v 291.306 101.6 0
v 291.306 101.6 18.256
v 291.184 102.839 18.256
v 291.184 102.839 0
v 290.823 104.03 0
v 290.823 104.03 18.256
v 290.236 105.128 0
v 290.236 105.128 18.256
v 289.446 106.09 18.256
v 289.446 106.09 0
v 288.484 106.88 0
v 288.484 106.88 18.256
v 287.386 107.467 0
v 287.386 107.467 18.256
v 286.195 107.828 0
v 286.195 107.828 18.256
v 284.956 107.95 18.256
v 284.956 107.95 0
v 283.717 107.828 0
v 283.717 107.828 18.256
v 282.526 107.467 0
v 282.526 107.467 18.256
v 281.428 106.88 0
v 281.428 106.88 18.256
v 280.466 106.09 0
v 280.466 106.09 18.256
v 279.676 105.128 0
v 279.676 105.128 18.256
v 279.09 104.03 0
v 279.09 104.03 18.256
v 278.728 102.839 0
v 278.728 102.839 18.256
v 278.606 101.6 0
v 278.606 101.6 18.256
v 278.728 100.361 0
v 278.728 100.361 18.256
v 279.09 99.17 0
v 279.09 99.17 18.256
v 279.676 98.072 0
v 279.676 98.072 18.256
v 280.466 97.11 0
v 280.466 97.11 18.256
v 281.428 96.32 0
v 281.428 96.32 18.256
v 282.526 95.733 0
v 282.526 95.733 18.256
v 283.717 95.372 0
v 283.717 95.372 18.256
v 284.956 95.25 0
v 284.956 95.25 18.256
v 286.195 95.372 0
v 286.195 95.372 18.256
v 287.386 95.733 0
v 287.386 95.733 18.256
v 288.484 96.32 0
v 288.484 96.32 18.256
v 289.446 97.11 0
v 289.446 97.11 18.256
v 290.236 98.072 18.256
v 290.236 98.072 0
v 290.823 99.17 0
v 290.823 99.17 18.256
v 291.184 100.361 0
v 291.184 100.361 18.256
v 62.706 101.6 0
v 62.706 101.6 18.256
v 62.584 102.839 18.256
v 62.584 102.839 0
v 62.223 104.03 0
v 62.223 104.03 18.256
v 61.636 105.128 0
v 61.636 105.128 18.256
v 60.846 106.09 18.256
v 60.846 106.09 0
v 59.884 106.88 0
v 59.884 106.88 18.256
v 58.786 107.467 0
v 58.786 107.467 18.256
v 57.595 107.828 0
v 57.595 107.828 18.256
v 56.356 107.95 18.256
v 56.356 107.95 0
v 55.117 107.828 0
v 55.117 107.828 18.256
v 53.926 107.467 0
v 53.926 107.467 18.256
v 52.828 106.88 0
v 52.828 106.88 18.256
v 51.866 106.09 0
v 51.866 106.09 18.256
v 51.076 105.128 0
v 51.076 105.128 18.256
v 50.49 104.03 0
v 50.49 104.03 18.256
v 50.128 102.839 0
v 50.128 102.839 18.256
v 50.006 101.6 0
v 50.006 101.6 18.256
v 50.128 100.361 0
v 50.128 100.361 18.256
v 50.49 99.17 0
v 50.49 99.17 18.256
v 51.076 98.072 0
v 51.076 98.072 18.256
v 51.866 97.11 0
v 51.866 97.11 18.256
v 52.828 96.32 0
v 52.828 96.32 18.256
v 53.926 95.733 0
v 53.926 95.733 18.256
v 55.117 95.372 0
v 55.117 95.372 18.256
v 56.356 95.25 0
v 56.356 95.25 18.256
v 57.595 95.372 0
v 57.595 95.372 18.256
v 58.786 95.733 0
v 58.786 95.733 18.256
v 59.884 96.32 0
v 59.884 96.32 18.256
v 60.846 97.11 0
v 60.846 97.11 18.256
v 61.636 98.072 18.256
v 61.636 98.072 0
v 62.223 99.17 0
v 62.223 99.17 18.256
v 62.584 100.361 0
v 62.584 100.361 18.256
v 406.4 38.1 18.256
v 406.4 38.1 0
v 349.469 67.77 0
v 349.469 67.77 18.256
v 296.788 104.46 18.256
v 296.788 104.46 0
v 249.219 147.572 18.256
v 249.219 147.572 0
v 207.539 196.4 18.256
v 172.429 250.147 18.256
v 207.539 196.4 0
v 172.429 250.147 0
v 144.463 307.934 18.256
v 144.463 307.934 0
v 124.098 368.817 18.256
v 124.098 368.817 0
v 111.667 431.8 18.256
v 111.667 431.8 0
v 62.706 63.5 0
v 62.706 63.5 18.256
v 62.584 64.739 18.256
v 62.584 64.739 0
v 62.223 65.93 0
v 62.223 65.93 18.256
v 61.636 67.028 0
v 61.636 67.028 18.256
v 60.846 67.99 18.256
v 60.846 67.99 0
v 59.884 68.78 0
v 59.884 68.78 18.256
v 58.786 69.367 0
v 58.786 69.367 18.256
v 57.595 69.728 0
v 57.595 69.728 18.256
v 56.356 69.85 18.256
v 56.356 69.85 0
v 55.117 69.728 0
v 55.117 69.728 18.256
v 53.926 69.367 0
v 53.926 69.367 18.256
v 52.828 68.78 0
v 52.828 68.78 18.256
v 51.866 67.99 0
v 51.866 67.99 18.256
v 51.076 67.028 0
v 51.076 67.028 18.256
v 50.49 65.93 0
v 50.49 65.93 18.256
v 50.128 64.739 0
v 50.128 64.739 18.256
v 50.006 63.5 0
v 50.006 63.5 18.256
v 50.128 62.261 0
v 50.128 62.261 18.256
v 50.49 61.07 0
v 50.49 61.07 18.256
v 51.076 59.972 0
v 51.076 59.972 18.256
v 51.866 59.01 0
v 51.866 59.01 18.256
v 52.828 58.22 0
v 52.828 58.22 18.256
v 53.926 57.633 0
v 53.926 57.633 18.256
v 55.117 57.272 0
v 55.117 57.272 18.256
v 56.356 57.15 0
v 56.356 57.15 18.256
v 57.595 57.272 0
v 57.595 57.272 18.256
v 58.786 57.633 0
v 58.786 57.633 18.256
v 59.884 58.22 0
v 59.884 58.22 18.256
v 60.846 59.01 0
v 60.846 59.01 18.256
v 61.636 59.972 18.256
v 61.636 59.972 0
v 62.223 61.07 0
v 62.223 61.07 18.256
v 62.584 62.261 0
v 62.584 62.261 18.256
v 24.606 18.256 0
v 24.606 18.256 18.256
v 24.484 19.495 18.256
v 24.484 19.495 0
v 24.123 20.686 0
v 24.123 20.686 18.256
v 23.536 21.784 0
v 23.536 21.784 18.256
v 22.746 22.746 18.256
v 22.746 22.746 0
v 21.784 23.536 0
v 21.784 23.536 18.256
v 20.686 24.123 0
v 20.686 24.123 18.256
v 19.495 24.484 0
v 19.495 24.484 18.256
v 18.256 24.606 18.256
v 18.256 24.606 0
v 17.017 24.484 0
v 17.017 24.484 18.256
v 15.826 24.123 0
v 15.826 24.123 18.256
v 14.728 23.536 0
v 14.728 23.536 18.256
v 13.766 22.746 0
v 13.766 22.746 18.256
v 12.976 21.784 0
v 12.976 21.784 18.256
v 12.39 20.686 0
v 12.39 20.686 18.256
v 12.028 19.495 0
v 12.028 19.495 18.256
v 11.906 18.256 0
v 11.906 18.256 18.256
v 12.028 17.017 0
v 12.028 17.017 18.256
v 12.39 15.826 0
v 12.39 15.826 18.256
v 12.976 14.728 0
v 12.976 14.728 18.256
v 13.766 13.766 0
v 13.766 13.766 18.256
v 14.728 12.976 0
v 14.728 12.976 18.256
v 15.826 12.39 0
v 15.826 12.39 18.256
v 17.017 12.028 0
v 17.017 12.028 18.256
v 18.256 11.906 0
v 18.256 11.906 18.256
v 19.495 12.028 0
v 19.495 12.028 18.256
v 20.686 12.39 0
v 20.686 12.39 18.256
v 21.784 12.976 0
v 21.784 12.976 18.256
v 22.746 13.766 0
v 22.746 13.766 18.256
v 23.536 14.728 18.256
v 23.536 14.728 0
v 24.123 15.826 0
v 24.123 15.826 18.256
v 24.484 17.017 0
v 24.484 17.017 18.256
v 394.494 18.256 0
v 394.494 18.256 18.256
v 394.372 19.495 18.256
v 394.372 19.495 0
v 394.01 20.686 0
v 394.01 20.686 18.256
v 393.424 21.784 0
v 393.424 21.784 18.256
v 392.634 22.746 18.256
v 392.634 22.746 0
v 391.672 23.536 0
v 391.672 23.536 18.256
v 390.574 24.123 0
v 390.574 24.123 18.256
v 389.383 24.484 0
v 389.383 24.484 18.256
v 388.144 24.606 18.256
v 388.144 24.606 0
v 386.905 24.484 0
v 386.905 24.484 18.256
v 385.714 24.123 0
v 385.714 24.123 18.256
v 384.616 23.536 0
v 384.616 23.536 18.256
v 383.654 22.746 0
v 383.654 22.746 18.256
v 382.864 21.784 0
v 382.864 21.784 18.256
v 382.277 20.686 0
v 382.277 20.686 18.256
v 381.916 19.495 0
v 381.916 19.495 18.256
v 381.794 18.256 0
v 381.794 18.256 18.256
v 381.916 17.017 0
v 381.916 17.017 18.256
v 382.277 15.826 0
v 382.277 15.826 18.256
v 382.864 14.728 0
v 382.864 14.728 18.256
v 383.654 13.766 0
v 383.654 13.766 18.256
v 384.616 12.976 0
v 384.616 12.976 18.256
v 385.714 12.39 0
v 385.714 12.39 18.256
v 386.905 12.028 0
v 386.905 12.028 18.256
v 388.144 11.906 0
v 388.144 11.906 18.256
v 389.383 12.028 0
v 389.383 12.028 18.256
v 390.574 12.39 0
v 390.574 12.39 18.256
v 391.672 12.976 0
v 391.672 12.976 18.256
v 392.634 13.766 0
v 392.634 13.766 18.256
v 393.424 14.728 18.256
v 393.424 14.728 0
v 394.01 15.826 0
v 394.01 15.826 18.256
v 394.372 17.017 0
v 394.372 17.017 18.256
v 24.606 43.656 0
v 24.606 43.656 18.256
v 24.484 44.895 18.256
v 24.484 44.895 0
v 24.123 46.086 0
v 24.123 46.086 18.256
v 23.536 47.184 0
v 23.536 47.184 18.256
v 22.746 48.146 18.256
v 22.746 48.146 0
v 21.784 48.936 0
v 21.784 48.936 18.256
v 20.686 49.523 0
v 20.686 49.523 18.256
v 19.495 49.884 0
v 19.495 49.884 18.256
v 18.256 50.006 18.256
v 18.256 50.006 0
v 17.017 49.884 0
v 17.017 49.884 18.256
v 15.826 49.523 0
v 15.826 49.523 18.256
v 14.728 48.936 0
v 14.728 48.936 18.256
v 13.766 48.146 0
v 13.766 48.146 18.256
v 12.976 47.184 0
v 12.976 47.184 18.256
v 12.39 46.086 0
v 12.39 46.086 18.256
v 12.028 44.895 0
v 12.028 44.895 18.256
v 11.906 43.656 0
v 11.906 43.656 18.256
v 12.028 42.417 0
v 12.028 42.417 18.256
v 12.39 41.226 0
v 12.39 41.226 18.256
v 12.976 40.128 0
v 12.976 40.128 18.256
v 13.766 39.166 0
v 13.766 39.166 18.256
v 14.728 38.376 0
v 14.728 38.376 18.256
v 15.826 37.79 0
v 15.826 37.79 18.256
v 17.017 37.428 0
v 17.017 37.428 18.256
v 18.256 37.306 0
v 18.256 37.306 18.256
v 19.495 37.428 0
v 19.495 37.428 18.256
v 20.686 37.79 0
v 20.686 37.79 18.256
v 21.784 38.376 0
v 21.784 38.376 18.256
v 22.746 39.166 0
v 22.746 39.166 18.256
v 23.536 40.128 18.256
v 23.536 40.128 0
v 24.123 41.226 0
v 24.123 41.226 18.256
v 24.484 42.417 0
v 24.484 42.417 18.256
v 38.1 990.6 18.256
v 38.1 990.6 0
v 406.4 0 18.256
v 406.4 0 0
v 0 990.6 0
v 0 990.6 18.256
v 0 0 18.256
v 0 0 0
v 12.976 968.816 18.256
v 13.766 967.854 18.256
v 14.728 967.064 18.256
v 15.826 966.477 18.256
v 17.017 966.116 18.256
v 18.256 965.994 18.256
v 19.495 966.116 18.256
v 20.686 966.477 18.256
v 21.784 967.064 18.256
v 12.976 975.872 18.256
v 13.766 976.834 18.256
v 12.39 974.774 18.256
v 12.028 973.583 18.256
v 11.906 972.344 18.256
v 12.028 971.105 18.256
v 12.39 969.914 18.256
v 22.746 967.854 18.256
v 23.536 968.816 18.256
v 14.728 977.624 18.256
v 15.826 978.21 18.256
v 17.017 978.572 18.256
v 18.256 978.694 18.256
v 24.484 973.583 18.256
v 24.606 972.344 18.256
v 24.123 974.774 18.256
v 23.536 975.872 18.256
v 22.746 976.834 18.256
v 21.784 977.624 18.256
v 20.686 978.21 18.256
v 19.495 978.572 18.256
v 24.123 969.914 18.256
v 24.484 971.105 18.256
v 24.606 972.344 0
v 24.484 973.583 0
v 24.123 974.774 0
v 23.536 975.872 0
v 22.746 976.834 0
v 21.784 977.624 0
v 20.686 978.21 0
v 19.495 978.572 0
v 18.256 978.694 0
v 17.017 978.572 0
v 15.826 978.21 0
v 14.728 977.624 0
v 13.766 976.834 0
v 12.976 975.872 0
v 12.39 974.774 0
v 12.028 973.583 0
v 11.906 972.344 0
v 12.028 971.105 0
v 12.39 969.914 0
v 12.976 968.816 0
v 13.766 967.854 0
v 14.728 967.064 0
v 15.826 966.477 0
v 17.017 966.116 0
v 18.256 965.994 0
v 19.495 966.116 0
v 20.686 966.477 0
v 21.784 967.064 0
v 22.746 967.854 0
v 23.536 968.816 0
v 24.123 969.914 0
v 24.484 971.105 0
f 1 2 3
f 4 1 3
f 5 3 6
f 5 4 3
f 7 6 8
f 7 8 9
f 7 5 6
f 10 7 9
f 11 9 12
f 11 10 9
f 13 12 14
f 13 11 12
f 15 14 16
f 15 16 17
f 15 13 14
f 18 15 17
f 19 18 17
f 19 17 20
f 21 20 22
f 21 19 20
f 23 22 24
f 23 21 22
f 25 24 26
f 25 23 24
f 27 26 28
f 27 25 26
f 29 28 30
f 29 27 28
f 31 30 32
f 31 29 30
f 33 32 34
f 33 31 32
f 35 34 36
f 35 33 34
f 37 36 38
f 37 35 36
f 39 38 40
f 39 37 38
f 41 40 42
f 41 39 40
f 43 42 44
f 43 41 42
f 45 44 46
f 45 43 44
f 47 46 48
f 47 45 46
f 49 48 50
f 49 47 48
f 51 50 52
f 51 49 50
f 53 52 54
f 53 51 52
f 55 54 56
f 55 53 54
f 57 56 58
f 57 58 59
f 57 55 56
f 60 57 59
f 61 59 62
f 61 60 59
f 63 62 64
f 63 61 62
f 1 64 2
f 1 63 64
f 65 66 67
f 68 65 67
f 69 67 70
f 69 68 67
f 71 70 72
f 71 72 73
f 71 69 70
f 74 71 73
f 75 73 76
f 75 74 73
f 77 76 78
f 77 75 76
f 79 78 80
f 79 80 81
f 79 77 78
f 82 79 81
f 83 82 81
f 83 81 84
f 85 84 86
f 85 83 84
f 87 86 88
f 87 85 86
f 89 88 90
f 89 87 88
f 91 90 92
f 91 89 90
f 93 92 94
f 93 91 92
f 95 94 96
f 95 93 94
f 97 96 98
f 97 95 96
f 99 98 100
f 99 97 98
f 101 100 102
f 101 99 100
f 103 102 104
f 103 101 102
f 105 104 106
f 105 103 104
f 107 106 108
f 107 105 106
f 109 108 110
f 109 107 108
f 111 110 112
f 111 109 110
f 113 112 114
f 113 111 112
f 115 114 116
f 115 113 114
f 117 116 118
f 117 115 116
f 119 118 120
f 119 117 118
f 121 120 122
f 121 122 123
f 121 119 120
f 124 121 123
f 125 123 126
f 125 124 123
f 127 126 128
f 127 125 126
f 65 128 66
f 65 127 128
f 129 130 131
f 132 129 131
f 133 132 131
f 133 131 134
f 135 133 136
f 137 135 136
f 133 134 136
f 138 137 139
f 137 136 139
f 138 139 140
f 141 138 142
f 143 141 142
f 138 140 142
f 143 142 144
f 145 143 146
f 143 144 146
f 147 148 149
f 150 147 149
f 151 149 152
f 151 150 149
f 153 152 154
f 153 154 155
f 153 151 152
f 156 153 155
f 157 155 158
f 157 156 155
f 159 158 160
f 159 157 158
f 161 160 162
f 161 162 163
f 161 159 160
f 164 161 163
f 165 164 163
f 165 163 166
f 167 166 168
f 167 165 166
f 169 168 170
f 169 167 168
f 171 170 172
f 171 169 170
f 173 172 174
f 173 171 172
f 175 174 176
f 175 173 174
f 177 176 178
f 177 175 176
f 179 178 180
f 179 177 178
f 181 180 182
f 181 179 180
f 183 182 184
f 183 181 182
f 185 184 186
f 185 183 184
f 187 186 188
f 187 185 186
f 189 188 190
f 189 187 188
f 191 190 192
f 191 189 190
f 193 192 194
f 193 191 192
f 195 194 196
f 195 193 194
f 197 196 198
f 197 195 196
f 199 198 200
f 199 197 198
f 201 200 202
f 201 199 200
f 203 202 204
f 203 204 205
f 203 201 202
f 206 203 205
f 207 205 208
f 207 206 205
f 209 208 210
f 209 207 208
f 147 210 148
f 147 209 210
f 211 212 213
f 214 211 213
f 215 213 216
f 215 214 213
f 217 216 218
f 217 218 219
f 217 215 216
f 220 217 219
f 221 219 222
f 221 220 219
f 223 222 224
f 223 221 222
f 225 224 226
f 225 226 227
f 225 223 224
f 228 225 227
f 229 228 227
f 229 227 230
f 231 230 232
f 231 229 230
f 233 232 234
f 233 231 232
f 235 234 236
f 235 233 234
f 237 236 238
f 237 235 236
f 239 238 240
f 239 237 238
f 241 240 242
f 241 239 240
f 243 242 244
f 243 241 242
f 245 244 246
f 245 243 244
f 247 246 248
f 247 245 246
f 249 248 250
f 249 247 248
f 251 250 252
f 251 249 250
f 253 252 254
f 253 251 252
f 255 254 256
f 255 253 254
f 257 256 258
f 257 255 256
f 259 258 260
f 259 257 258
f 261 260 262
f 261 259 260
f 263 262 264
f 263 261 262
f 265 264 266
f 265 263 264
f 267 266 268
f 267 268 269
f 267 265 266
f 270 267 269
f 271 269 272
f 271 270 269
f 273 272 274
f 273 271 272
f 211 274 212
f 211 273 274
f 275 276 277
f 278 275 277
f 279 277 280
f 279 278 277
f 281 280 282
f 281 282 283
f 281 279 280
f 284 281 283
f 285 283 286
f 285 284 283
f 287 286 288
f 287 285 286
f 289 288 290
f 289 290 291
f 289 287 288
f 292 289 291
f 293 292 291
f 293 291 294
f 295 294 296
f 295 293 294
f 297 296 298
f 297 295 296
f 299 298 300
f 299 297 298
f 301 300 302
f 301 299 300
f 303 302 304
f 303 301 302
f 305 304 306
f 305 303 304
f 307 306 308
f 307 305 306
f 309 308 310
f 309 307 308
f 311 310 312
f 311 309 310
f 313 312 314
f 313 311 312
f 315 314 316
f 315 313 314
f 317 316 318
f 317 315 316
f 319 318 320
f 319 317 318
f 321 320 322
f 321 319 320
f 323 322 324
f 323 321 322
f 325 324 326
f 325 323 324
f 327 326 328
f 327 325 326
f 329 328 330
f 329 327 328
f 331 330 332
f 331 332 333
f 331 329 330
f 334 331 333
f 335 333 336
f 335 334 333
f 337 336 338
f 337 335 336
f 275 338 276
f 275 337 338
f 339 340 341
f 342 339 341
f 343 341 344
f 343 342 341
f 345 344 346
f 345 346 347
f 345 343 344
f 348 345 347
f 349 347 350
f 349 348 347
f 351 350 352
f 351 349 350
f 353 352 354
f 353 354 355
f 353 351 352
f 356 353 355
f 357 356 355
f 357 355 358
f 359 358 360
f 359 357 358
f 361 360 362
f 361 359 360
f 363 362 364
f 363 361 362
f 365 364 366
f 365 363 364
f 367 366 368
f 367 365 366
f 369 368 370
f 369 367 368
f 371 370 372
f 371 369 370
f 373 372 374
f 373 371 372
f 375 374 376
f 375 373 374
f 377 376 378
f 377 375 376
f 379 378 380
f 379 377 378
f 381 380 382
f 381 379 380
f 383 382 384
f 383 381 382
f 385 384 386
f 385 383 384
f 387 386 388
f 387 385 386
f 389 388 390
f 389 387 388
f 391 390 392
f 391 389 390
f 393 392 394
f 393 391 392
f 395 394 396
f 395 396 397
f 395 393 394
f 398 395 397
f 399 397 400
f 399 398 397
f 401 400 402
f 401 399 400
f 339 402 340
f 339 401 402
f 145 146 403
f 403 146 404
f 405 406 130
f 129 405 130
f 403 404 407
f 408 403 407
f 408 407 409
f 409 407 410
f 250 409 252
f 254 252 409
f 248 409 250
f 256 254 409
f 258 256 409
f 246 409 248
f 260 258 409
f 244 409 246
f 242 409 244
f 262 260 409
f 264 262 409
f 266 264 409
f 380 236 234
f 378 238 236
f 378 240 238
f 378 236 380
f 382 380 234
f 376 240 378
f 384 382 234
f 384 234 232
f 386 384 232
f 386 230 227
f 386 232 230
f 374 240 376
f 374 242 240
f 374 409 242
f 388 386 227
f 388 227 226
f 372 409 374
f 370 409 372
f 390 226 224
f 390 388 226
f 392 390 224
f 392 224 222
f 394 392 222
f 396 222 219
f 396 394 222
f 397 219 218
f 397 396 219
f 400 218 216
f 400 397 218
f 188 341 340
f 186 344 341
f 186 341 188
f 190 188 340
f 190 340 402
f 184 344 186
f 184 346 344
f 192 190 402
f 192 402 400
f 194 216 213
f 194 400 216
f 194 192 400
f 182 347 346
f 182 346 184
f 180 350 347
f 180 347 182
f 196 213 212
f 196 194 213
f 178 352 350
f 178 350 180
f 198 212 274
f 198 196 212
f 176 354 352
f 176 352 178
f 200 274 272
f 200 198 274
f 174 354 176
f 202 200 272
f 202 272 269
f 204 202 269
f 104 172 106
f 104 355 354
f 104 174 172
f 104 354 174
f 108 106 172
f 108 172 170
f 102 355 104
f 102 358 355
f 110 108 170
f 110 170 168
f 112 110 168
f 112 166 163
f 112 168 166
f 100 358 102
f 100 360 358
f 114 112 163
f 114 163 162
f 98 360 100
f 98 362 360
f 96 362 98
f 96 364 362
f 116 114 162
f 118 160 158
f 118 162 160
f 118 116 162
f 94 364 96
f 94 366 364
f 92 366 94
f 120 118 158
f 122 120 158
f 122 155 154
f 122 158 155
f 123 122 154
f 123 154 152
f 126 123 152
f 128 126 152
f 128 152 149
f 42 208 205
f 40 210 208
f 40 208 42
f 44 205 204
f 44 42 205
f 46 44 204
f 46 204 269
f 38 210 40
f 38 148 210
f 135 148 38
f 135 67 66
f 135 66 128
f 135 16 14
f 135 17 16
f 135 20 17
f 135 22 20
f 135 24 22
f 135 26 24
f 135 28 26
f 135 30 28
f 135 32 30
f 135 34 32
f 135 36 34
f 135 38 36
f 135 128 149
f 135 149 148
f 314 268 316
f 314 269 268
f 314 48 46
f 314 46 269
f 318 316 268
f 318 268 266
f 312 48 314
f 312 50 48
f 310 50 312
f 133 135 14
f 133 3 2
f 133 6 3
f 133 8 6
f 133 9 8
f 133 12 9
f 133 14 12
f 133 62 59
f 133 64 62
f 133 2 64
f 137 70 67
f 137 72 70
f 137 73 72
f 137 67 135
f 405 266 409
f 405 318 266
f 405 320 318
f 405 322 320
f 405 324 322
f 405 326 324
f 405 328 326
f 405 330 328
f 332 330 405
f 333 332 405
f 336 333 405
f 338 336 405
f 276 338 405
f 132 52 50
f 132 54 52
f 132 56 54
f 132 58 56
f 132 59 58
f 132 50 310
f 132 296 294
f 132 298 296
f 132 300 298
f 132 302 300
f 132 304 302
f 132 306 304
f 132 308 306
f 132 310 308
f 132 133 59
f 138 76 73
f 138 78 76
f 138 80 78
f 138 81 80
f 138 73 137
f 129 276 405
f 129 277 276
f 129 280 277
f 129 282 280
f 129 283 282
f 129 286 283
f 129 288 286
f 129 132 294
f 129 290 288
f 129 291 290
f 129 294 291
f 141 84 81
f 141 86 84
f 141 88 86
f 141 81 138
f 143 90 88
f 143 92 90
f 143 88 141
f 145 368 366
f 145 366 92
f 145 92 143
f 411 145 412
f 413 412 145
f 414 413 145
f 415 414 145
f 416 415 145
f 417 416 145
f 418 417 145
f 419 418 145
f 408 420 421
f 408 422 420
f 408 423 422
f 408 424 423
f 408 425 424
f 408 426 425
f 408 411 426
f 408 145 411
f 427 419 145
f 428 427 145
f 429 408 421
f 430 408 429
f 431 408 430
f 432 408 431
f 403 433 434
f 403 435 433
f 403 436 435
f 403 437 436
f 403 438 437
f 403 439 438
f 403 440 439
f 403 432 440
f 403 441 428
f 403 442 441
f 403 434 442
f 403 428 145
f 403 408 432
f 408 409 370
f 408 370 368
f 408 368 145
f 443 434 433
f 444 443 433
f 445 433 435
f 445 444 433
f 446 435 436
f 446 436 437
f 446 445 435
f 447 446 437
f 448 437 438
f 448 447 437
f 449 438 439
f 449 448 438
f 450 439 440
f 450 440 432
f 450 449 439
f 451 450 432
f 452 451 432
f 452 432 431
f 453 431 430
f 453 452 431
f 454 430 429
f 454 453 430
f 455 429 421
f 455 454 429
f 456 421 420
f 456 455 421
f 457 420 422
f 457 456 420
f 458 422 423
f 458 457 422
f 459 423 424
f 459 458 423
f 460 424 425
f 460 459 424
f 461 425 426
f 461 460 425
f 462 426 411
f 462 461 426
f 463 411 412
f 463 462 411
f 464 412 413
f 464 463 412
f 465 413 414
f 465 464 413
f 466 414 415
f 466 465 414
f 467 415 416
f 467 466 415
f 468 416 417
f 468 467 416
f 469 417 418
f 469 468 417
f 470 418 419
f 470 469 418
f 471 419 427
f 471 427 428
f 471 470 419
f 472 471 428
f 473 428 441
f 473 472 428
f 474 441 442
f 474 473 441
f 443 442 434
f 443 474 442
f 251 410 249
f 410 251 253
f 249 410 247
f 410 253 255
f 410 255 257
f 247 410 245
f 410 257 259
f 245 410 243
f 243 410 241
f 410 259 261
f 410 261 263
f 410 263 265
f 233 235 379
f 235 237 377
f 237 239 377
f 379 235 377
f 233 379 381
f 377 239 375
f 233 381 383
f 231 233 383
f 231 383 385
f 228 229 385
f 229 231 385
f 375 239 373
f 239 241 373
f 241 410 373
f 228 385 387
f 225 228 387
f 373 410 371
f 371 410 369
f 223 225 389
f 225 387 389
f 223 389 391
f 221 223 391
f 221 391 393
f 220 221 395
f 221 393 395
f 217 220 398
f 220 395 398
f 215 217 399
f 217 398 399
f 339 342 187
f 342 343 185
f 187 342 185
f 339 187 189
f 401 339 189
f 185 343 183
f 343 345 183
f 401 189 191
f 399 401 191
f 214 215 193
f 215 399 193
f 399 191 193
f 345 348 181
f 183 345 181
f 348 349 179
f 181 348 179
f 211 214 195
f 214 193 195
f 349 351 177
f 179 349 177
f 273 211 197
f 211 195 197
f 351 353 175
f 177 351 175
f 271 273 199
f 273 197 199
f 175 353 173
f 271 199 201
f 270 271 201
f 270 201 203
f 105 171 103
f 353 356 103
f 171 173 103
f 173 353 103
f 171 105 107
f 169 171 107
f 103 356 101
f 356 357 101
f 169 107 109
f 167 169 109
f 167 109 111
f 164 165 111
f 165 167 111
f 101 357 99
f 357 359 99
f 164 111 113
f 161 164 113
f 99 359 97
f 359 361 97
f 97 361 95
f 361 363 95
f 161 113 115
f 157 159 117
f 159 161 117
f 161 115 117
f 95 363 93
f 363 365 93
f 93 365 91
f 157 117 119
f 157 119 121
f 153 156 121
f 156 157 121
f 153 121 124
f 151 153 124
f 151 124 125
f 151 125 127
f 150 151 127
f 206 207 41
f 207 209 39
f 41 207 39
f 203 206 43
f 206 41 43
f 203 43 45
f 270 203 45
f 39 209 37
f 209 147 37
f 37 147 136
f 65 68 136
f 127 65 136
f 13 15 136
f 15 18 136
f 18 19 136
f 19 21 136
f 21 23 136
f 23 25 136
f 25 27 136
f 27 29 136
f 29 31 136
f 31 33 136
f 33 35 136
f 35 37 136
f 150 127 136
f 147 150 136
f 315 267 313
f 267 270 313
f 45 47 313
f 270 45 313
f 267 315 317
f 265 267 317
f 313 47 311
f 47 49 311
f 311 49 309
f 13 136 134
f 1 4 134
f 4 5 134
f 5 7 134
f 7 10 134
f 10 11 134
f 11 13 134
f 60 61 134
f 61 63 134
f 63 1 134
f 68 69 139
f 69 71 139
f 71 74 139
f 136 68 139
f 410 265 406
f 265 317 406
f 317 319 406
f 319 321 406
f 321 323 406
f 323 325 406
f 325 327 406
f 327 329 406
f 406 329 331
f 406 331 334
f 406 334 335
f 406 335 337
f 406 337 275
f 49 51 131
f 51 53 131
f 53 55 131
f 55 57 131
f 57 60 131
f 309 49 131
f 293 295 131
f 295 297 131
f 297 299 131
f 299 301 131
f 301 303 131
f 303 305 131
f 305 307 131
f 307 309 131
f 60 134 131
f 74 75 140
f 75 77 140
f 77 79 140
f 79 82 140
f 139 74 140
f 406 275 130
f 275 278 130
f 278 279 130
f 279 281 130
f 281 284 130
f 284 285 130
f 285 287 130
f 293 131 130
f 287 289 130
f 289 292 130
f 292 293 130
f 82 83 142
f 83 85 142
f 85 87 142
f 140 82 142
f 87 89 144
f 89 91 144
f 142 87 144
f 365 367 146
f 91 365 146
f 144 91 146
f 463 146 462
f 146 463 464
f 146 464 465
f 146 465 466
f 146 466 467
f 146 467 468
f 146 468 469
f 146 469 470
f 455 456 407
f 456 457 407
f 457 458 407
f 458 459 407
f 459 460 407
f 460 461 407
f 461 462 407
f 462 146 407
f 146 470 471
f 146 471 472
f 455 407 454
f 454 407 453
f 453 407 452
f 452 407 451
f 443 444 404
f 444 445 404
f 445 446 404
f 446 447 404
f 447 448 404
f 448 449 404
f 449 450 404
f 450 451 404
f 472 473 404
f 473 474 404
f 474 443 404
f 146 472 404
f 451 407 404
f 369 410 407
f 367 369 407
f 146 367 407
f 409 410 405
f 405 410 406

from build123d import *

# Parameters (mm, degrees)
SKETCH1_R           = 6.35
BOSS_EXTRUDE1_DEPTH = 18.25625


with BuildPart() as part:
    # Sketch1 → Boss-Extrude1 (new body)
    with BuildSketch(Plane.XY):
        with BuildLine():
            Line((0, 0), (406.4, 0))
            Line((406.4, 0), (406.4, 38.1))
            ThreePointArc((406.4, 38.1), (207.539140749, 196.40002074), (111.667415652, 431.8))
            Line((111.667415652, 431.8), (38.1, 990.6))
            Line((38.1, 990.6), (0, 990.6))
            Line((0, 990.6), (0, 0))
        make_face()
        with Locations((18.25625, 18.25625)):
            Circle(SKETCH1_R, mode=Mode.SUBTRACT)
        with Locations((388.14375, 18.25625)):
            Circle(SKETCH1_R, mode=Mode.SUBTRACT)
        with Locations((18.25625, 972.34375)):
            Circle(SKETCH1_R, mode=Mode.SUBTRACT)
        with Locations((56.35625, 101.6)):
            Circle(SKETCH1_R, mode=Mode.SUBTRACT)
        with Locations((284.95625, 101.6)):
            Circle(SKETCH1_R, mode=Mode.SUBTRACT)
        with Locations((18.25625, 43.65625)):
            Circle(SKETCH1_R, mode=Mode.SUBTRACT)
        with Locations((56.35625, 63.5)):
            Circle(SKETCH1_R, mode=Mode.SUBTRACT)
    extrude(amount=BOSS_EXTRUDE1_DEPTH)


solid = part.part
